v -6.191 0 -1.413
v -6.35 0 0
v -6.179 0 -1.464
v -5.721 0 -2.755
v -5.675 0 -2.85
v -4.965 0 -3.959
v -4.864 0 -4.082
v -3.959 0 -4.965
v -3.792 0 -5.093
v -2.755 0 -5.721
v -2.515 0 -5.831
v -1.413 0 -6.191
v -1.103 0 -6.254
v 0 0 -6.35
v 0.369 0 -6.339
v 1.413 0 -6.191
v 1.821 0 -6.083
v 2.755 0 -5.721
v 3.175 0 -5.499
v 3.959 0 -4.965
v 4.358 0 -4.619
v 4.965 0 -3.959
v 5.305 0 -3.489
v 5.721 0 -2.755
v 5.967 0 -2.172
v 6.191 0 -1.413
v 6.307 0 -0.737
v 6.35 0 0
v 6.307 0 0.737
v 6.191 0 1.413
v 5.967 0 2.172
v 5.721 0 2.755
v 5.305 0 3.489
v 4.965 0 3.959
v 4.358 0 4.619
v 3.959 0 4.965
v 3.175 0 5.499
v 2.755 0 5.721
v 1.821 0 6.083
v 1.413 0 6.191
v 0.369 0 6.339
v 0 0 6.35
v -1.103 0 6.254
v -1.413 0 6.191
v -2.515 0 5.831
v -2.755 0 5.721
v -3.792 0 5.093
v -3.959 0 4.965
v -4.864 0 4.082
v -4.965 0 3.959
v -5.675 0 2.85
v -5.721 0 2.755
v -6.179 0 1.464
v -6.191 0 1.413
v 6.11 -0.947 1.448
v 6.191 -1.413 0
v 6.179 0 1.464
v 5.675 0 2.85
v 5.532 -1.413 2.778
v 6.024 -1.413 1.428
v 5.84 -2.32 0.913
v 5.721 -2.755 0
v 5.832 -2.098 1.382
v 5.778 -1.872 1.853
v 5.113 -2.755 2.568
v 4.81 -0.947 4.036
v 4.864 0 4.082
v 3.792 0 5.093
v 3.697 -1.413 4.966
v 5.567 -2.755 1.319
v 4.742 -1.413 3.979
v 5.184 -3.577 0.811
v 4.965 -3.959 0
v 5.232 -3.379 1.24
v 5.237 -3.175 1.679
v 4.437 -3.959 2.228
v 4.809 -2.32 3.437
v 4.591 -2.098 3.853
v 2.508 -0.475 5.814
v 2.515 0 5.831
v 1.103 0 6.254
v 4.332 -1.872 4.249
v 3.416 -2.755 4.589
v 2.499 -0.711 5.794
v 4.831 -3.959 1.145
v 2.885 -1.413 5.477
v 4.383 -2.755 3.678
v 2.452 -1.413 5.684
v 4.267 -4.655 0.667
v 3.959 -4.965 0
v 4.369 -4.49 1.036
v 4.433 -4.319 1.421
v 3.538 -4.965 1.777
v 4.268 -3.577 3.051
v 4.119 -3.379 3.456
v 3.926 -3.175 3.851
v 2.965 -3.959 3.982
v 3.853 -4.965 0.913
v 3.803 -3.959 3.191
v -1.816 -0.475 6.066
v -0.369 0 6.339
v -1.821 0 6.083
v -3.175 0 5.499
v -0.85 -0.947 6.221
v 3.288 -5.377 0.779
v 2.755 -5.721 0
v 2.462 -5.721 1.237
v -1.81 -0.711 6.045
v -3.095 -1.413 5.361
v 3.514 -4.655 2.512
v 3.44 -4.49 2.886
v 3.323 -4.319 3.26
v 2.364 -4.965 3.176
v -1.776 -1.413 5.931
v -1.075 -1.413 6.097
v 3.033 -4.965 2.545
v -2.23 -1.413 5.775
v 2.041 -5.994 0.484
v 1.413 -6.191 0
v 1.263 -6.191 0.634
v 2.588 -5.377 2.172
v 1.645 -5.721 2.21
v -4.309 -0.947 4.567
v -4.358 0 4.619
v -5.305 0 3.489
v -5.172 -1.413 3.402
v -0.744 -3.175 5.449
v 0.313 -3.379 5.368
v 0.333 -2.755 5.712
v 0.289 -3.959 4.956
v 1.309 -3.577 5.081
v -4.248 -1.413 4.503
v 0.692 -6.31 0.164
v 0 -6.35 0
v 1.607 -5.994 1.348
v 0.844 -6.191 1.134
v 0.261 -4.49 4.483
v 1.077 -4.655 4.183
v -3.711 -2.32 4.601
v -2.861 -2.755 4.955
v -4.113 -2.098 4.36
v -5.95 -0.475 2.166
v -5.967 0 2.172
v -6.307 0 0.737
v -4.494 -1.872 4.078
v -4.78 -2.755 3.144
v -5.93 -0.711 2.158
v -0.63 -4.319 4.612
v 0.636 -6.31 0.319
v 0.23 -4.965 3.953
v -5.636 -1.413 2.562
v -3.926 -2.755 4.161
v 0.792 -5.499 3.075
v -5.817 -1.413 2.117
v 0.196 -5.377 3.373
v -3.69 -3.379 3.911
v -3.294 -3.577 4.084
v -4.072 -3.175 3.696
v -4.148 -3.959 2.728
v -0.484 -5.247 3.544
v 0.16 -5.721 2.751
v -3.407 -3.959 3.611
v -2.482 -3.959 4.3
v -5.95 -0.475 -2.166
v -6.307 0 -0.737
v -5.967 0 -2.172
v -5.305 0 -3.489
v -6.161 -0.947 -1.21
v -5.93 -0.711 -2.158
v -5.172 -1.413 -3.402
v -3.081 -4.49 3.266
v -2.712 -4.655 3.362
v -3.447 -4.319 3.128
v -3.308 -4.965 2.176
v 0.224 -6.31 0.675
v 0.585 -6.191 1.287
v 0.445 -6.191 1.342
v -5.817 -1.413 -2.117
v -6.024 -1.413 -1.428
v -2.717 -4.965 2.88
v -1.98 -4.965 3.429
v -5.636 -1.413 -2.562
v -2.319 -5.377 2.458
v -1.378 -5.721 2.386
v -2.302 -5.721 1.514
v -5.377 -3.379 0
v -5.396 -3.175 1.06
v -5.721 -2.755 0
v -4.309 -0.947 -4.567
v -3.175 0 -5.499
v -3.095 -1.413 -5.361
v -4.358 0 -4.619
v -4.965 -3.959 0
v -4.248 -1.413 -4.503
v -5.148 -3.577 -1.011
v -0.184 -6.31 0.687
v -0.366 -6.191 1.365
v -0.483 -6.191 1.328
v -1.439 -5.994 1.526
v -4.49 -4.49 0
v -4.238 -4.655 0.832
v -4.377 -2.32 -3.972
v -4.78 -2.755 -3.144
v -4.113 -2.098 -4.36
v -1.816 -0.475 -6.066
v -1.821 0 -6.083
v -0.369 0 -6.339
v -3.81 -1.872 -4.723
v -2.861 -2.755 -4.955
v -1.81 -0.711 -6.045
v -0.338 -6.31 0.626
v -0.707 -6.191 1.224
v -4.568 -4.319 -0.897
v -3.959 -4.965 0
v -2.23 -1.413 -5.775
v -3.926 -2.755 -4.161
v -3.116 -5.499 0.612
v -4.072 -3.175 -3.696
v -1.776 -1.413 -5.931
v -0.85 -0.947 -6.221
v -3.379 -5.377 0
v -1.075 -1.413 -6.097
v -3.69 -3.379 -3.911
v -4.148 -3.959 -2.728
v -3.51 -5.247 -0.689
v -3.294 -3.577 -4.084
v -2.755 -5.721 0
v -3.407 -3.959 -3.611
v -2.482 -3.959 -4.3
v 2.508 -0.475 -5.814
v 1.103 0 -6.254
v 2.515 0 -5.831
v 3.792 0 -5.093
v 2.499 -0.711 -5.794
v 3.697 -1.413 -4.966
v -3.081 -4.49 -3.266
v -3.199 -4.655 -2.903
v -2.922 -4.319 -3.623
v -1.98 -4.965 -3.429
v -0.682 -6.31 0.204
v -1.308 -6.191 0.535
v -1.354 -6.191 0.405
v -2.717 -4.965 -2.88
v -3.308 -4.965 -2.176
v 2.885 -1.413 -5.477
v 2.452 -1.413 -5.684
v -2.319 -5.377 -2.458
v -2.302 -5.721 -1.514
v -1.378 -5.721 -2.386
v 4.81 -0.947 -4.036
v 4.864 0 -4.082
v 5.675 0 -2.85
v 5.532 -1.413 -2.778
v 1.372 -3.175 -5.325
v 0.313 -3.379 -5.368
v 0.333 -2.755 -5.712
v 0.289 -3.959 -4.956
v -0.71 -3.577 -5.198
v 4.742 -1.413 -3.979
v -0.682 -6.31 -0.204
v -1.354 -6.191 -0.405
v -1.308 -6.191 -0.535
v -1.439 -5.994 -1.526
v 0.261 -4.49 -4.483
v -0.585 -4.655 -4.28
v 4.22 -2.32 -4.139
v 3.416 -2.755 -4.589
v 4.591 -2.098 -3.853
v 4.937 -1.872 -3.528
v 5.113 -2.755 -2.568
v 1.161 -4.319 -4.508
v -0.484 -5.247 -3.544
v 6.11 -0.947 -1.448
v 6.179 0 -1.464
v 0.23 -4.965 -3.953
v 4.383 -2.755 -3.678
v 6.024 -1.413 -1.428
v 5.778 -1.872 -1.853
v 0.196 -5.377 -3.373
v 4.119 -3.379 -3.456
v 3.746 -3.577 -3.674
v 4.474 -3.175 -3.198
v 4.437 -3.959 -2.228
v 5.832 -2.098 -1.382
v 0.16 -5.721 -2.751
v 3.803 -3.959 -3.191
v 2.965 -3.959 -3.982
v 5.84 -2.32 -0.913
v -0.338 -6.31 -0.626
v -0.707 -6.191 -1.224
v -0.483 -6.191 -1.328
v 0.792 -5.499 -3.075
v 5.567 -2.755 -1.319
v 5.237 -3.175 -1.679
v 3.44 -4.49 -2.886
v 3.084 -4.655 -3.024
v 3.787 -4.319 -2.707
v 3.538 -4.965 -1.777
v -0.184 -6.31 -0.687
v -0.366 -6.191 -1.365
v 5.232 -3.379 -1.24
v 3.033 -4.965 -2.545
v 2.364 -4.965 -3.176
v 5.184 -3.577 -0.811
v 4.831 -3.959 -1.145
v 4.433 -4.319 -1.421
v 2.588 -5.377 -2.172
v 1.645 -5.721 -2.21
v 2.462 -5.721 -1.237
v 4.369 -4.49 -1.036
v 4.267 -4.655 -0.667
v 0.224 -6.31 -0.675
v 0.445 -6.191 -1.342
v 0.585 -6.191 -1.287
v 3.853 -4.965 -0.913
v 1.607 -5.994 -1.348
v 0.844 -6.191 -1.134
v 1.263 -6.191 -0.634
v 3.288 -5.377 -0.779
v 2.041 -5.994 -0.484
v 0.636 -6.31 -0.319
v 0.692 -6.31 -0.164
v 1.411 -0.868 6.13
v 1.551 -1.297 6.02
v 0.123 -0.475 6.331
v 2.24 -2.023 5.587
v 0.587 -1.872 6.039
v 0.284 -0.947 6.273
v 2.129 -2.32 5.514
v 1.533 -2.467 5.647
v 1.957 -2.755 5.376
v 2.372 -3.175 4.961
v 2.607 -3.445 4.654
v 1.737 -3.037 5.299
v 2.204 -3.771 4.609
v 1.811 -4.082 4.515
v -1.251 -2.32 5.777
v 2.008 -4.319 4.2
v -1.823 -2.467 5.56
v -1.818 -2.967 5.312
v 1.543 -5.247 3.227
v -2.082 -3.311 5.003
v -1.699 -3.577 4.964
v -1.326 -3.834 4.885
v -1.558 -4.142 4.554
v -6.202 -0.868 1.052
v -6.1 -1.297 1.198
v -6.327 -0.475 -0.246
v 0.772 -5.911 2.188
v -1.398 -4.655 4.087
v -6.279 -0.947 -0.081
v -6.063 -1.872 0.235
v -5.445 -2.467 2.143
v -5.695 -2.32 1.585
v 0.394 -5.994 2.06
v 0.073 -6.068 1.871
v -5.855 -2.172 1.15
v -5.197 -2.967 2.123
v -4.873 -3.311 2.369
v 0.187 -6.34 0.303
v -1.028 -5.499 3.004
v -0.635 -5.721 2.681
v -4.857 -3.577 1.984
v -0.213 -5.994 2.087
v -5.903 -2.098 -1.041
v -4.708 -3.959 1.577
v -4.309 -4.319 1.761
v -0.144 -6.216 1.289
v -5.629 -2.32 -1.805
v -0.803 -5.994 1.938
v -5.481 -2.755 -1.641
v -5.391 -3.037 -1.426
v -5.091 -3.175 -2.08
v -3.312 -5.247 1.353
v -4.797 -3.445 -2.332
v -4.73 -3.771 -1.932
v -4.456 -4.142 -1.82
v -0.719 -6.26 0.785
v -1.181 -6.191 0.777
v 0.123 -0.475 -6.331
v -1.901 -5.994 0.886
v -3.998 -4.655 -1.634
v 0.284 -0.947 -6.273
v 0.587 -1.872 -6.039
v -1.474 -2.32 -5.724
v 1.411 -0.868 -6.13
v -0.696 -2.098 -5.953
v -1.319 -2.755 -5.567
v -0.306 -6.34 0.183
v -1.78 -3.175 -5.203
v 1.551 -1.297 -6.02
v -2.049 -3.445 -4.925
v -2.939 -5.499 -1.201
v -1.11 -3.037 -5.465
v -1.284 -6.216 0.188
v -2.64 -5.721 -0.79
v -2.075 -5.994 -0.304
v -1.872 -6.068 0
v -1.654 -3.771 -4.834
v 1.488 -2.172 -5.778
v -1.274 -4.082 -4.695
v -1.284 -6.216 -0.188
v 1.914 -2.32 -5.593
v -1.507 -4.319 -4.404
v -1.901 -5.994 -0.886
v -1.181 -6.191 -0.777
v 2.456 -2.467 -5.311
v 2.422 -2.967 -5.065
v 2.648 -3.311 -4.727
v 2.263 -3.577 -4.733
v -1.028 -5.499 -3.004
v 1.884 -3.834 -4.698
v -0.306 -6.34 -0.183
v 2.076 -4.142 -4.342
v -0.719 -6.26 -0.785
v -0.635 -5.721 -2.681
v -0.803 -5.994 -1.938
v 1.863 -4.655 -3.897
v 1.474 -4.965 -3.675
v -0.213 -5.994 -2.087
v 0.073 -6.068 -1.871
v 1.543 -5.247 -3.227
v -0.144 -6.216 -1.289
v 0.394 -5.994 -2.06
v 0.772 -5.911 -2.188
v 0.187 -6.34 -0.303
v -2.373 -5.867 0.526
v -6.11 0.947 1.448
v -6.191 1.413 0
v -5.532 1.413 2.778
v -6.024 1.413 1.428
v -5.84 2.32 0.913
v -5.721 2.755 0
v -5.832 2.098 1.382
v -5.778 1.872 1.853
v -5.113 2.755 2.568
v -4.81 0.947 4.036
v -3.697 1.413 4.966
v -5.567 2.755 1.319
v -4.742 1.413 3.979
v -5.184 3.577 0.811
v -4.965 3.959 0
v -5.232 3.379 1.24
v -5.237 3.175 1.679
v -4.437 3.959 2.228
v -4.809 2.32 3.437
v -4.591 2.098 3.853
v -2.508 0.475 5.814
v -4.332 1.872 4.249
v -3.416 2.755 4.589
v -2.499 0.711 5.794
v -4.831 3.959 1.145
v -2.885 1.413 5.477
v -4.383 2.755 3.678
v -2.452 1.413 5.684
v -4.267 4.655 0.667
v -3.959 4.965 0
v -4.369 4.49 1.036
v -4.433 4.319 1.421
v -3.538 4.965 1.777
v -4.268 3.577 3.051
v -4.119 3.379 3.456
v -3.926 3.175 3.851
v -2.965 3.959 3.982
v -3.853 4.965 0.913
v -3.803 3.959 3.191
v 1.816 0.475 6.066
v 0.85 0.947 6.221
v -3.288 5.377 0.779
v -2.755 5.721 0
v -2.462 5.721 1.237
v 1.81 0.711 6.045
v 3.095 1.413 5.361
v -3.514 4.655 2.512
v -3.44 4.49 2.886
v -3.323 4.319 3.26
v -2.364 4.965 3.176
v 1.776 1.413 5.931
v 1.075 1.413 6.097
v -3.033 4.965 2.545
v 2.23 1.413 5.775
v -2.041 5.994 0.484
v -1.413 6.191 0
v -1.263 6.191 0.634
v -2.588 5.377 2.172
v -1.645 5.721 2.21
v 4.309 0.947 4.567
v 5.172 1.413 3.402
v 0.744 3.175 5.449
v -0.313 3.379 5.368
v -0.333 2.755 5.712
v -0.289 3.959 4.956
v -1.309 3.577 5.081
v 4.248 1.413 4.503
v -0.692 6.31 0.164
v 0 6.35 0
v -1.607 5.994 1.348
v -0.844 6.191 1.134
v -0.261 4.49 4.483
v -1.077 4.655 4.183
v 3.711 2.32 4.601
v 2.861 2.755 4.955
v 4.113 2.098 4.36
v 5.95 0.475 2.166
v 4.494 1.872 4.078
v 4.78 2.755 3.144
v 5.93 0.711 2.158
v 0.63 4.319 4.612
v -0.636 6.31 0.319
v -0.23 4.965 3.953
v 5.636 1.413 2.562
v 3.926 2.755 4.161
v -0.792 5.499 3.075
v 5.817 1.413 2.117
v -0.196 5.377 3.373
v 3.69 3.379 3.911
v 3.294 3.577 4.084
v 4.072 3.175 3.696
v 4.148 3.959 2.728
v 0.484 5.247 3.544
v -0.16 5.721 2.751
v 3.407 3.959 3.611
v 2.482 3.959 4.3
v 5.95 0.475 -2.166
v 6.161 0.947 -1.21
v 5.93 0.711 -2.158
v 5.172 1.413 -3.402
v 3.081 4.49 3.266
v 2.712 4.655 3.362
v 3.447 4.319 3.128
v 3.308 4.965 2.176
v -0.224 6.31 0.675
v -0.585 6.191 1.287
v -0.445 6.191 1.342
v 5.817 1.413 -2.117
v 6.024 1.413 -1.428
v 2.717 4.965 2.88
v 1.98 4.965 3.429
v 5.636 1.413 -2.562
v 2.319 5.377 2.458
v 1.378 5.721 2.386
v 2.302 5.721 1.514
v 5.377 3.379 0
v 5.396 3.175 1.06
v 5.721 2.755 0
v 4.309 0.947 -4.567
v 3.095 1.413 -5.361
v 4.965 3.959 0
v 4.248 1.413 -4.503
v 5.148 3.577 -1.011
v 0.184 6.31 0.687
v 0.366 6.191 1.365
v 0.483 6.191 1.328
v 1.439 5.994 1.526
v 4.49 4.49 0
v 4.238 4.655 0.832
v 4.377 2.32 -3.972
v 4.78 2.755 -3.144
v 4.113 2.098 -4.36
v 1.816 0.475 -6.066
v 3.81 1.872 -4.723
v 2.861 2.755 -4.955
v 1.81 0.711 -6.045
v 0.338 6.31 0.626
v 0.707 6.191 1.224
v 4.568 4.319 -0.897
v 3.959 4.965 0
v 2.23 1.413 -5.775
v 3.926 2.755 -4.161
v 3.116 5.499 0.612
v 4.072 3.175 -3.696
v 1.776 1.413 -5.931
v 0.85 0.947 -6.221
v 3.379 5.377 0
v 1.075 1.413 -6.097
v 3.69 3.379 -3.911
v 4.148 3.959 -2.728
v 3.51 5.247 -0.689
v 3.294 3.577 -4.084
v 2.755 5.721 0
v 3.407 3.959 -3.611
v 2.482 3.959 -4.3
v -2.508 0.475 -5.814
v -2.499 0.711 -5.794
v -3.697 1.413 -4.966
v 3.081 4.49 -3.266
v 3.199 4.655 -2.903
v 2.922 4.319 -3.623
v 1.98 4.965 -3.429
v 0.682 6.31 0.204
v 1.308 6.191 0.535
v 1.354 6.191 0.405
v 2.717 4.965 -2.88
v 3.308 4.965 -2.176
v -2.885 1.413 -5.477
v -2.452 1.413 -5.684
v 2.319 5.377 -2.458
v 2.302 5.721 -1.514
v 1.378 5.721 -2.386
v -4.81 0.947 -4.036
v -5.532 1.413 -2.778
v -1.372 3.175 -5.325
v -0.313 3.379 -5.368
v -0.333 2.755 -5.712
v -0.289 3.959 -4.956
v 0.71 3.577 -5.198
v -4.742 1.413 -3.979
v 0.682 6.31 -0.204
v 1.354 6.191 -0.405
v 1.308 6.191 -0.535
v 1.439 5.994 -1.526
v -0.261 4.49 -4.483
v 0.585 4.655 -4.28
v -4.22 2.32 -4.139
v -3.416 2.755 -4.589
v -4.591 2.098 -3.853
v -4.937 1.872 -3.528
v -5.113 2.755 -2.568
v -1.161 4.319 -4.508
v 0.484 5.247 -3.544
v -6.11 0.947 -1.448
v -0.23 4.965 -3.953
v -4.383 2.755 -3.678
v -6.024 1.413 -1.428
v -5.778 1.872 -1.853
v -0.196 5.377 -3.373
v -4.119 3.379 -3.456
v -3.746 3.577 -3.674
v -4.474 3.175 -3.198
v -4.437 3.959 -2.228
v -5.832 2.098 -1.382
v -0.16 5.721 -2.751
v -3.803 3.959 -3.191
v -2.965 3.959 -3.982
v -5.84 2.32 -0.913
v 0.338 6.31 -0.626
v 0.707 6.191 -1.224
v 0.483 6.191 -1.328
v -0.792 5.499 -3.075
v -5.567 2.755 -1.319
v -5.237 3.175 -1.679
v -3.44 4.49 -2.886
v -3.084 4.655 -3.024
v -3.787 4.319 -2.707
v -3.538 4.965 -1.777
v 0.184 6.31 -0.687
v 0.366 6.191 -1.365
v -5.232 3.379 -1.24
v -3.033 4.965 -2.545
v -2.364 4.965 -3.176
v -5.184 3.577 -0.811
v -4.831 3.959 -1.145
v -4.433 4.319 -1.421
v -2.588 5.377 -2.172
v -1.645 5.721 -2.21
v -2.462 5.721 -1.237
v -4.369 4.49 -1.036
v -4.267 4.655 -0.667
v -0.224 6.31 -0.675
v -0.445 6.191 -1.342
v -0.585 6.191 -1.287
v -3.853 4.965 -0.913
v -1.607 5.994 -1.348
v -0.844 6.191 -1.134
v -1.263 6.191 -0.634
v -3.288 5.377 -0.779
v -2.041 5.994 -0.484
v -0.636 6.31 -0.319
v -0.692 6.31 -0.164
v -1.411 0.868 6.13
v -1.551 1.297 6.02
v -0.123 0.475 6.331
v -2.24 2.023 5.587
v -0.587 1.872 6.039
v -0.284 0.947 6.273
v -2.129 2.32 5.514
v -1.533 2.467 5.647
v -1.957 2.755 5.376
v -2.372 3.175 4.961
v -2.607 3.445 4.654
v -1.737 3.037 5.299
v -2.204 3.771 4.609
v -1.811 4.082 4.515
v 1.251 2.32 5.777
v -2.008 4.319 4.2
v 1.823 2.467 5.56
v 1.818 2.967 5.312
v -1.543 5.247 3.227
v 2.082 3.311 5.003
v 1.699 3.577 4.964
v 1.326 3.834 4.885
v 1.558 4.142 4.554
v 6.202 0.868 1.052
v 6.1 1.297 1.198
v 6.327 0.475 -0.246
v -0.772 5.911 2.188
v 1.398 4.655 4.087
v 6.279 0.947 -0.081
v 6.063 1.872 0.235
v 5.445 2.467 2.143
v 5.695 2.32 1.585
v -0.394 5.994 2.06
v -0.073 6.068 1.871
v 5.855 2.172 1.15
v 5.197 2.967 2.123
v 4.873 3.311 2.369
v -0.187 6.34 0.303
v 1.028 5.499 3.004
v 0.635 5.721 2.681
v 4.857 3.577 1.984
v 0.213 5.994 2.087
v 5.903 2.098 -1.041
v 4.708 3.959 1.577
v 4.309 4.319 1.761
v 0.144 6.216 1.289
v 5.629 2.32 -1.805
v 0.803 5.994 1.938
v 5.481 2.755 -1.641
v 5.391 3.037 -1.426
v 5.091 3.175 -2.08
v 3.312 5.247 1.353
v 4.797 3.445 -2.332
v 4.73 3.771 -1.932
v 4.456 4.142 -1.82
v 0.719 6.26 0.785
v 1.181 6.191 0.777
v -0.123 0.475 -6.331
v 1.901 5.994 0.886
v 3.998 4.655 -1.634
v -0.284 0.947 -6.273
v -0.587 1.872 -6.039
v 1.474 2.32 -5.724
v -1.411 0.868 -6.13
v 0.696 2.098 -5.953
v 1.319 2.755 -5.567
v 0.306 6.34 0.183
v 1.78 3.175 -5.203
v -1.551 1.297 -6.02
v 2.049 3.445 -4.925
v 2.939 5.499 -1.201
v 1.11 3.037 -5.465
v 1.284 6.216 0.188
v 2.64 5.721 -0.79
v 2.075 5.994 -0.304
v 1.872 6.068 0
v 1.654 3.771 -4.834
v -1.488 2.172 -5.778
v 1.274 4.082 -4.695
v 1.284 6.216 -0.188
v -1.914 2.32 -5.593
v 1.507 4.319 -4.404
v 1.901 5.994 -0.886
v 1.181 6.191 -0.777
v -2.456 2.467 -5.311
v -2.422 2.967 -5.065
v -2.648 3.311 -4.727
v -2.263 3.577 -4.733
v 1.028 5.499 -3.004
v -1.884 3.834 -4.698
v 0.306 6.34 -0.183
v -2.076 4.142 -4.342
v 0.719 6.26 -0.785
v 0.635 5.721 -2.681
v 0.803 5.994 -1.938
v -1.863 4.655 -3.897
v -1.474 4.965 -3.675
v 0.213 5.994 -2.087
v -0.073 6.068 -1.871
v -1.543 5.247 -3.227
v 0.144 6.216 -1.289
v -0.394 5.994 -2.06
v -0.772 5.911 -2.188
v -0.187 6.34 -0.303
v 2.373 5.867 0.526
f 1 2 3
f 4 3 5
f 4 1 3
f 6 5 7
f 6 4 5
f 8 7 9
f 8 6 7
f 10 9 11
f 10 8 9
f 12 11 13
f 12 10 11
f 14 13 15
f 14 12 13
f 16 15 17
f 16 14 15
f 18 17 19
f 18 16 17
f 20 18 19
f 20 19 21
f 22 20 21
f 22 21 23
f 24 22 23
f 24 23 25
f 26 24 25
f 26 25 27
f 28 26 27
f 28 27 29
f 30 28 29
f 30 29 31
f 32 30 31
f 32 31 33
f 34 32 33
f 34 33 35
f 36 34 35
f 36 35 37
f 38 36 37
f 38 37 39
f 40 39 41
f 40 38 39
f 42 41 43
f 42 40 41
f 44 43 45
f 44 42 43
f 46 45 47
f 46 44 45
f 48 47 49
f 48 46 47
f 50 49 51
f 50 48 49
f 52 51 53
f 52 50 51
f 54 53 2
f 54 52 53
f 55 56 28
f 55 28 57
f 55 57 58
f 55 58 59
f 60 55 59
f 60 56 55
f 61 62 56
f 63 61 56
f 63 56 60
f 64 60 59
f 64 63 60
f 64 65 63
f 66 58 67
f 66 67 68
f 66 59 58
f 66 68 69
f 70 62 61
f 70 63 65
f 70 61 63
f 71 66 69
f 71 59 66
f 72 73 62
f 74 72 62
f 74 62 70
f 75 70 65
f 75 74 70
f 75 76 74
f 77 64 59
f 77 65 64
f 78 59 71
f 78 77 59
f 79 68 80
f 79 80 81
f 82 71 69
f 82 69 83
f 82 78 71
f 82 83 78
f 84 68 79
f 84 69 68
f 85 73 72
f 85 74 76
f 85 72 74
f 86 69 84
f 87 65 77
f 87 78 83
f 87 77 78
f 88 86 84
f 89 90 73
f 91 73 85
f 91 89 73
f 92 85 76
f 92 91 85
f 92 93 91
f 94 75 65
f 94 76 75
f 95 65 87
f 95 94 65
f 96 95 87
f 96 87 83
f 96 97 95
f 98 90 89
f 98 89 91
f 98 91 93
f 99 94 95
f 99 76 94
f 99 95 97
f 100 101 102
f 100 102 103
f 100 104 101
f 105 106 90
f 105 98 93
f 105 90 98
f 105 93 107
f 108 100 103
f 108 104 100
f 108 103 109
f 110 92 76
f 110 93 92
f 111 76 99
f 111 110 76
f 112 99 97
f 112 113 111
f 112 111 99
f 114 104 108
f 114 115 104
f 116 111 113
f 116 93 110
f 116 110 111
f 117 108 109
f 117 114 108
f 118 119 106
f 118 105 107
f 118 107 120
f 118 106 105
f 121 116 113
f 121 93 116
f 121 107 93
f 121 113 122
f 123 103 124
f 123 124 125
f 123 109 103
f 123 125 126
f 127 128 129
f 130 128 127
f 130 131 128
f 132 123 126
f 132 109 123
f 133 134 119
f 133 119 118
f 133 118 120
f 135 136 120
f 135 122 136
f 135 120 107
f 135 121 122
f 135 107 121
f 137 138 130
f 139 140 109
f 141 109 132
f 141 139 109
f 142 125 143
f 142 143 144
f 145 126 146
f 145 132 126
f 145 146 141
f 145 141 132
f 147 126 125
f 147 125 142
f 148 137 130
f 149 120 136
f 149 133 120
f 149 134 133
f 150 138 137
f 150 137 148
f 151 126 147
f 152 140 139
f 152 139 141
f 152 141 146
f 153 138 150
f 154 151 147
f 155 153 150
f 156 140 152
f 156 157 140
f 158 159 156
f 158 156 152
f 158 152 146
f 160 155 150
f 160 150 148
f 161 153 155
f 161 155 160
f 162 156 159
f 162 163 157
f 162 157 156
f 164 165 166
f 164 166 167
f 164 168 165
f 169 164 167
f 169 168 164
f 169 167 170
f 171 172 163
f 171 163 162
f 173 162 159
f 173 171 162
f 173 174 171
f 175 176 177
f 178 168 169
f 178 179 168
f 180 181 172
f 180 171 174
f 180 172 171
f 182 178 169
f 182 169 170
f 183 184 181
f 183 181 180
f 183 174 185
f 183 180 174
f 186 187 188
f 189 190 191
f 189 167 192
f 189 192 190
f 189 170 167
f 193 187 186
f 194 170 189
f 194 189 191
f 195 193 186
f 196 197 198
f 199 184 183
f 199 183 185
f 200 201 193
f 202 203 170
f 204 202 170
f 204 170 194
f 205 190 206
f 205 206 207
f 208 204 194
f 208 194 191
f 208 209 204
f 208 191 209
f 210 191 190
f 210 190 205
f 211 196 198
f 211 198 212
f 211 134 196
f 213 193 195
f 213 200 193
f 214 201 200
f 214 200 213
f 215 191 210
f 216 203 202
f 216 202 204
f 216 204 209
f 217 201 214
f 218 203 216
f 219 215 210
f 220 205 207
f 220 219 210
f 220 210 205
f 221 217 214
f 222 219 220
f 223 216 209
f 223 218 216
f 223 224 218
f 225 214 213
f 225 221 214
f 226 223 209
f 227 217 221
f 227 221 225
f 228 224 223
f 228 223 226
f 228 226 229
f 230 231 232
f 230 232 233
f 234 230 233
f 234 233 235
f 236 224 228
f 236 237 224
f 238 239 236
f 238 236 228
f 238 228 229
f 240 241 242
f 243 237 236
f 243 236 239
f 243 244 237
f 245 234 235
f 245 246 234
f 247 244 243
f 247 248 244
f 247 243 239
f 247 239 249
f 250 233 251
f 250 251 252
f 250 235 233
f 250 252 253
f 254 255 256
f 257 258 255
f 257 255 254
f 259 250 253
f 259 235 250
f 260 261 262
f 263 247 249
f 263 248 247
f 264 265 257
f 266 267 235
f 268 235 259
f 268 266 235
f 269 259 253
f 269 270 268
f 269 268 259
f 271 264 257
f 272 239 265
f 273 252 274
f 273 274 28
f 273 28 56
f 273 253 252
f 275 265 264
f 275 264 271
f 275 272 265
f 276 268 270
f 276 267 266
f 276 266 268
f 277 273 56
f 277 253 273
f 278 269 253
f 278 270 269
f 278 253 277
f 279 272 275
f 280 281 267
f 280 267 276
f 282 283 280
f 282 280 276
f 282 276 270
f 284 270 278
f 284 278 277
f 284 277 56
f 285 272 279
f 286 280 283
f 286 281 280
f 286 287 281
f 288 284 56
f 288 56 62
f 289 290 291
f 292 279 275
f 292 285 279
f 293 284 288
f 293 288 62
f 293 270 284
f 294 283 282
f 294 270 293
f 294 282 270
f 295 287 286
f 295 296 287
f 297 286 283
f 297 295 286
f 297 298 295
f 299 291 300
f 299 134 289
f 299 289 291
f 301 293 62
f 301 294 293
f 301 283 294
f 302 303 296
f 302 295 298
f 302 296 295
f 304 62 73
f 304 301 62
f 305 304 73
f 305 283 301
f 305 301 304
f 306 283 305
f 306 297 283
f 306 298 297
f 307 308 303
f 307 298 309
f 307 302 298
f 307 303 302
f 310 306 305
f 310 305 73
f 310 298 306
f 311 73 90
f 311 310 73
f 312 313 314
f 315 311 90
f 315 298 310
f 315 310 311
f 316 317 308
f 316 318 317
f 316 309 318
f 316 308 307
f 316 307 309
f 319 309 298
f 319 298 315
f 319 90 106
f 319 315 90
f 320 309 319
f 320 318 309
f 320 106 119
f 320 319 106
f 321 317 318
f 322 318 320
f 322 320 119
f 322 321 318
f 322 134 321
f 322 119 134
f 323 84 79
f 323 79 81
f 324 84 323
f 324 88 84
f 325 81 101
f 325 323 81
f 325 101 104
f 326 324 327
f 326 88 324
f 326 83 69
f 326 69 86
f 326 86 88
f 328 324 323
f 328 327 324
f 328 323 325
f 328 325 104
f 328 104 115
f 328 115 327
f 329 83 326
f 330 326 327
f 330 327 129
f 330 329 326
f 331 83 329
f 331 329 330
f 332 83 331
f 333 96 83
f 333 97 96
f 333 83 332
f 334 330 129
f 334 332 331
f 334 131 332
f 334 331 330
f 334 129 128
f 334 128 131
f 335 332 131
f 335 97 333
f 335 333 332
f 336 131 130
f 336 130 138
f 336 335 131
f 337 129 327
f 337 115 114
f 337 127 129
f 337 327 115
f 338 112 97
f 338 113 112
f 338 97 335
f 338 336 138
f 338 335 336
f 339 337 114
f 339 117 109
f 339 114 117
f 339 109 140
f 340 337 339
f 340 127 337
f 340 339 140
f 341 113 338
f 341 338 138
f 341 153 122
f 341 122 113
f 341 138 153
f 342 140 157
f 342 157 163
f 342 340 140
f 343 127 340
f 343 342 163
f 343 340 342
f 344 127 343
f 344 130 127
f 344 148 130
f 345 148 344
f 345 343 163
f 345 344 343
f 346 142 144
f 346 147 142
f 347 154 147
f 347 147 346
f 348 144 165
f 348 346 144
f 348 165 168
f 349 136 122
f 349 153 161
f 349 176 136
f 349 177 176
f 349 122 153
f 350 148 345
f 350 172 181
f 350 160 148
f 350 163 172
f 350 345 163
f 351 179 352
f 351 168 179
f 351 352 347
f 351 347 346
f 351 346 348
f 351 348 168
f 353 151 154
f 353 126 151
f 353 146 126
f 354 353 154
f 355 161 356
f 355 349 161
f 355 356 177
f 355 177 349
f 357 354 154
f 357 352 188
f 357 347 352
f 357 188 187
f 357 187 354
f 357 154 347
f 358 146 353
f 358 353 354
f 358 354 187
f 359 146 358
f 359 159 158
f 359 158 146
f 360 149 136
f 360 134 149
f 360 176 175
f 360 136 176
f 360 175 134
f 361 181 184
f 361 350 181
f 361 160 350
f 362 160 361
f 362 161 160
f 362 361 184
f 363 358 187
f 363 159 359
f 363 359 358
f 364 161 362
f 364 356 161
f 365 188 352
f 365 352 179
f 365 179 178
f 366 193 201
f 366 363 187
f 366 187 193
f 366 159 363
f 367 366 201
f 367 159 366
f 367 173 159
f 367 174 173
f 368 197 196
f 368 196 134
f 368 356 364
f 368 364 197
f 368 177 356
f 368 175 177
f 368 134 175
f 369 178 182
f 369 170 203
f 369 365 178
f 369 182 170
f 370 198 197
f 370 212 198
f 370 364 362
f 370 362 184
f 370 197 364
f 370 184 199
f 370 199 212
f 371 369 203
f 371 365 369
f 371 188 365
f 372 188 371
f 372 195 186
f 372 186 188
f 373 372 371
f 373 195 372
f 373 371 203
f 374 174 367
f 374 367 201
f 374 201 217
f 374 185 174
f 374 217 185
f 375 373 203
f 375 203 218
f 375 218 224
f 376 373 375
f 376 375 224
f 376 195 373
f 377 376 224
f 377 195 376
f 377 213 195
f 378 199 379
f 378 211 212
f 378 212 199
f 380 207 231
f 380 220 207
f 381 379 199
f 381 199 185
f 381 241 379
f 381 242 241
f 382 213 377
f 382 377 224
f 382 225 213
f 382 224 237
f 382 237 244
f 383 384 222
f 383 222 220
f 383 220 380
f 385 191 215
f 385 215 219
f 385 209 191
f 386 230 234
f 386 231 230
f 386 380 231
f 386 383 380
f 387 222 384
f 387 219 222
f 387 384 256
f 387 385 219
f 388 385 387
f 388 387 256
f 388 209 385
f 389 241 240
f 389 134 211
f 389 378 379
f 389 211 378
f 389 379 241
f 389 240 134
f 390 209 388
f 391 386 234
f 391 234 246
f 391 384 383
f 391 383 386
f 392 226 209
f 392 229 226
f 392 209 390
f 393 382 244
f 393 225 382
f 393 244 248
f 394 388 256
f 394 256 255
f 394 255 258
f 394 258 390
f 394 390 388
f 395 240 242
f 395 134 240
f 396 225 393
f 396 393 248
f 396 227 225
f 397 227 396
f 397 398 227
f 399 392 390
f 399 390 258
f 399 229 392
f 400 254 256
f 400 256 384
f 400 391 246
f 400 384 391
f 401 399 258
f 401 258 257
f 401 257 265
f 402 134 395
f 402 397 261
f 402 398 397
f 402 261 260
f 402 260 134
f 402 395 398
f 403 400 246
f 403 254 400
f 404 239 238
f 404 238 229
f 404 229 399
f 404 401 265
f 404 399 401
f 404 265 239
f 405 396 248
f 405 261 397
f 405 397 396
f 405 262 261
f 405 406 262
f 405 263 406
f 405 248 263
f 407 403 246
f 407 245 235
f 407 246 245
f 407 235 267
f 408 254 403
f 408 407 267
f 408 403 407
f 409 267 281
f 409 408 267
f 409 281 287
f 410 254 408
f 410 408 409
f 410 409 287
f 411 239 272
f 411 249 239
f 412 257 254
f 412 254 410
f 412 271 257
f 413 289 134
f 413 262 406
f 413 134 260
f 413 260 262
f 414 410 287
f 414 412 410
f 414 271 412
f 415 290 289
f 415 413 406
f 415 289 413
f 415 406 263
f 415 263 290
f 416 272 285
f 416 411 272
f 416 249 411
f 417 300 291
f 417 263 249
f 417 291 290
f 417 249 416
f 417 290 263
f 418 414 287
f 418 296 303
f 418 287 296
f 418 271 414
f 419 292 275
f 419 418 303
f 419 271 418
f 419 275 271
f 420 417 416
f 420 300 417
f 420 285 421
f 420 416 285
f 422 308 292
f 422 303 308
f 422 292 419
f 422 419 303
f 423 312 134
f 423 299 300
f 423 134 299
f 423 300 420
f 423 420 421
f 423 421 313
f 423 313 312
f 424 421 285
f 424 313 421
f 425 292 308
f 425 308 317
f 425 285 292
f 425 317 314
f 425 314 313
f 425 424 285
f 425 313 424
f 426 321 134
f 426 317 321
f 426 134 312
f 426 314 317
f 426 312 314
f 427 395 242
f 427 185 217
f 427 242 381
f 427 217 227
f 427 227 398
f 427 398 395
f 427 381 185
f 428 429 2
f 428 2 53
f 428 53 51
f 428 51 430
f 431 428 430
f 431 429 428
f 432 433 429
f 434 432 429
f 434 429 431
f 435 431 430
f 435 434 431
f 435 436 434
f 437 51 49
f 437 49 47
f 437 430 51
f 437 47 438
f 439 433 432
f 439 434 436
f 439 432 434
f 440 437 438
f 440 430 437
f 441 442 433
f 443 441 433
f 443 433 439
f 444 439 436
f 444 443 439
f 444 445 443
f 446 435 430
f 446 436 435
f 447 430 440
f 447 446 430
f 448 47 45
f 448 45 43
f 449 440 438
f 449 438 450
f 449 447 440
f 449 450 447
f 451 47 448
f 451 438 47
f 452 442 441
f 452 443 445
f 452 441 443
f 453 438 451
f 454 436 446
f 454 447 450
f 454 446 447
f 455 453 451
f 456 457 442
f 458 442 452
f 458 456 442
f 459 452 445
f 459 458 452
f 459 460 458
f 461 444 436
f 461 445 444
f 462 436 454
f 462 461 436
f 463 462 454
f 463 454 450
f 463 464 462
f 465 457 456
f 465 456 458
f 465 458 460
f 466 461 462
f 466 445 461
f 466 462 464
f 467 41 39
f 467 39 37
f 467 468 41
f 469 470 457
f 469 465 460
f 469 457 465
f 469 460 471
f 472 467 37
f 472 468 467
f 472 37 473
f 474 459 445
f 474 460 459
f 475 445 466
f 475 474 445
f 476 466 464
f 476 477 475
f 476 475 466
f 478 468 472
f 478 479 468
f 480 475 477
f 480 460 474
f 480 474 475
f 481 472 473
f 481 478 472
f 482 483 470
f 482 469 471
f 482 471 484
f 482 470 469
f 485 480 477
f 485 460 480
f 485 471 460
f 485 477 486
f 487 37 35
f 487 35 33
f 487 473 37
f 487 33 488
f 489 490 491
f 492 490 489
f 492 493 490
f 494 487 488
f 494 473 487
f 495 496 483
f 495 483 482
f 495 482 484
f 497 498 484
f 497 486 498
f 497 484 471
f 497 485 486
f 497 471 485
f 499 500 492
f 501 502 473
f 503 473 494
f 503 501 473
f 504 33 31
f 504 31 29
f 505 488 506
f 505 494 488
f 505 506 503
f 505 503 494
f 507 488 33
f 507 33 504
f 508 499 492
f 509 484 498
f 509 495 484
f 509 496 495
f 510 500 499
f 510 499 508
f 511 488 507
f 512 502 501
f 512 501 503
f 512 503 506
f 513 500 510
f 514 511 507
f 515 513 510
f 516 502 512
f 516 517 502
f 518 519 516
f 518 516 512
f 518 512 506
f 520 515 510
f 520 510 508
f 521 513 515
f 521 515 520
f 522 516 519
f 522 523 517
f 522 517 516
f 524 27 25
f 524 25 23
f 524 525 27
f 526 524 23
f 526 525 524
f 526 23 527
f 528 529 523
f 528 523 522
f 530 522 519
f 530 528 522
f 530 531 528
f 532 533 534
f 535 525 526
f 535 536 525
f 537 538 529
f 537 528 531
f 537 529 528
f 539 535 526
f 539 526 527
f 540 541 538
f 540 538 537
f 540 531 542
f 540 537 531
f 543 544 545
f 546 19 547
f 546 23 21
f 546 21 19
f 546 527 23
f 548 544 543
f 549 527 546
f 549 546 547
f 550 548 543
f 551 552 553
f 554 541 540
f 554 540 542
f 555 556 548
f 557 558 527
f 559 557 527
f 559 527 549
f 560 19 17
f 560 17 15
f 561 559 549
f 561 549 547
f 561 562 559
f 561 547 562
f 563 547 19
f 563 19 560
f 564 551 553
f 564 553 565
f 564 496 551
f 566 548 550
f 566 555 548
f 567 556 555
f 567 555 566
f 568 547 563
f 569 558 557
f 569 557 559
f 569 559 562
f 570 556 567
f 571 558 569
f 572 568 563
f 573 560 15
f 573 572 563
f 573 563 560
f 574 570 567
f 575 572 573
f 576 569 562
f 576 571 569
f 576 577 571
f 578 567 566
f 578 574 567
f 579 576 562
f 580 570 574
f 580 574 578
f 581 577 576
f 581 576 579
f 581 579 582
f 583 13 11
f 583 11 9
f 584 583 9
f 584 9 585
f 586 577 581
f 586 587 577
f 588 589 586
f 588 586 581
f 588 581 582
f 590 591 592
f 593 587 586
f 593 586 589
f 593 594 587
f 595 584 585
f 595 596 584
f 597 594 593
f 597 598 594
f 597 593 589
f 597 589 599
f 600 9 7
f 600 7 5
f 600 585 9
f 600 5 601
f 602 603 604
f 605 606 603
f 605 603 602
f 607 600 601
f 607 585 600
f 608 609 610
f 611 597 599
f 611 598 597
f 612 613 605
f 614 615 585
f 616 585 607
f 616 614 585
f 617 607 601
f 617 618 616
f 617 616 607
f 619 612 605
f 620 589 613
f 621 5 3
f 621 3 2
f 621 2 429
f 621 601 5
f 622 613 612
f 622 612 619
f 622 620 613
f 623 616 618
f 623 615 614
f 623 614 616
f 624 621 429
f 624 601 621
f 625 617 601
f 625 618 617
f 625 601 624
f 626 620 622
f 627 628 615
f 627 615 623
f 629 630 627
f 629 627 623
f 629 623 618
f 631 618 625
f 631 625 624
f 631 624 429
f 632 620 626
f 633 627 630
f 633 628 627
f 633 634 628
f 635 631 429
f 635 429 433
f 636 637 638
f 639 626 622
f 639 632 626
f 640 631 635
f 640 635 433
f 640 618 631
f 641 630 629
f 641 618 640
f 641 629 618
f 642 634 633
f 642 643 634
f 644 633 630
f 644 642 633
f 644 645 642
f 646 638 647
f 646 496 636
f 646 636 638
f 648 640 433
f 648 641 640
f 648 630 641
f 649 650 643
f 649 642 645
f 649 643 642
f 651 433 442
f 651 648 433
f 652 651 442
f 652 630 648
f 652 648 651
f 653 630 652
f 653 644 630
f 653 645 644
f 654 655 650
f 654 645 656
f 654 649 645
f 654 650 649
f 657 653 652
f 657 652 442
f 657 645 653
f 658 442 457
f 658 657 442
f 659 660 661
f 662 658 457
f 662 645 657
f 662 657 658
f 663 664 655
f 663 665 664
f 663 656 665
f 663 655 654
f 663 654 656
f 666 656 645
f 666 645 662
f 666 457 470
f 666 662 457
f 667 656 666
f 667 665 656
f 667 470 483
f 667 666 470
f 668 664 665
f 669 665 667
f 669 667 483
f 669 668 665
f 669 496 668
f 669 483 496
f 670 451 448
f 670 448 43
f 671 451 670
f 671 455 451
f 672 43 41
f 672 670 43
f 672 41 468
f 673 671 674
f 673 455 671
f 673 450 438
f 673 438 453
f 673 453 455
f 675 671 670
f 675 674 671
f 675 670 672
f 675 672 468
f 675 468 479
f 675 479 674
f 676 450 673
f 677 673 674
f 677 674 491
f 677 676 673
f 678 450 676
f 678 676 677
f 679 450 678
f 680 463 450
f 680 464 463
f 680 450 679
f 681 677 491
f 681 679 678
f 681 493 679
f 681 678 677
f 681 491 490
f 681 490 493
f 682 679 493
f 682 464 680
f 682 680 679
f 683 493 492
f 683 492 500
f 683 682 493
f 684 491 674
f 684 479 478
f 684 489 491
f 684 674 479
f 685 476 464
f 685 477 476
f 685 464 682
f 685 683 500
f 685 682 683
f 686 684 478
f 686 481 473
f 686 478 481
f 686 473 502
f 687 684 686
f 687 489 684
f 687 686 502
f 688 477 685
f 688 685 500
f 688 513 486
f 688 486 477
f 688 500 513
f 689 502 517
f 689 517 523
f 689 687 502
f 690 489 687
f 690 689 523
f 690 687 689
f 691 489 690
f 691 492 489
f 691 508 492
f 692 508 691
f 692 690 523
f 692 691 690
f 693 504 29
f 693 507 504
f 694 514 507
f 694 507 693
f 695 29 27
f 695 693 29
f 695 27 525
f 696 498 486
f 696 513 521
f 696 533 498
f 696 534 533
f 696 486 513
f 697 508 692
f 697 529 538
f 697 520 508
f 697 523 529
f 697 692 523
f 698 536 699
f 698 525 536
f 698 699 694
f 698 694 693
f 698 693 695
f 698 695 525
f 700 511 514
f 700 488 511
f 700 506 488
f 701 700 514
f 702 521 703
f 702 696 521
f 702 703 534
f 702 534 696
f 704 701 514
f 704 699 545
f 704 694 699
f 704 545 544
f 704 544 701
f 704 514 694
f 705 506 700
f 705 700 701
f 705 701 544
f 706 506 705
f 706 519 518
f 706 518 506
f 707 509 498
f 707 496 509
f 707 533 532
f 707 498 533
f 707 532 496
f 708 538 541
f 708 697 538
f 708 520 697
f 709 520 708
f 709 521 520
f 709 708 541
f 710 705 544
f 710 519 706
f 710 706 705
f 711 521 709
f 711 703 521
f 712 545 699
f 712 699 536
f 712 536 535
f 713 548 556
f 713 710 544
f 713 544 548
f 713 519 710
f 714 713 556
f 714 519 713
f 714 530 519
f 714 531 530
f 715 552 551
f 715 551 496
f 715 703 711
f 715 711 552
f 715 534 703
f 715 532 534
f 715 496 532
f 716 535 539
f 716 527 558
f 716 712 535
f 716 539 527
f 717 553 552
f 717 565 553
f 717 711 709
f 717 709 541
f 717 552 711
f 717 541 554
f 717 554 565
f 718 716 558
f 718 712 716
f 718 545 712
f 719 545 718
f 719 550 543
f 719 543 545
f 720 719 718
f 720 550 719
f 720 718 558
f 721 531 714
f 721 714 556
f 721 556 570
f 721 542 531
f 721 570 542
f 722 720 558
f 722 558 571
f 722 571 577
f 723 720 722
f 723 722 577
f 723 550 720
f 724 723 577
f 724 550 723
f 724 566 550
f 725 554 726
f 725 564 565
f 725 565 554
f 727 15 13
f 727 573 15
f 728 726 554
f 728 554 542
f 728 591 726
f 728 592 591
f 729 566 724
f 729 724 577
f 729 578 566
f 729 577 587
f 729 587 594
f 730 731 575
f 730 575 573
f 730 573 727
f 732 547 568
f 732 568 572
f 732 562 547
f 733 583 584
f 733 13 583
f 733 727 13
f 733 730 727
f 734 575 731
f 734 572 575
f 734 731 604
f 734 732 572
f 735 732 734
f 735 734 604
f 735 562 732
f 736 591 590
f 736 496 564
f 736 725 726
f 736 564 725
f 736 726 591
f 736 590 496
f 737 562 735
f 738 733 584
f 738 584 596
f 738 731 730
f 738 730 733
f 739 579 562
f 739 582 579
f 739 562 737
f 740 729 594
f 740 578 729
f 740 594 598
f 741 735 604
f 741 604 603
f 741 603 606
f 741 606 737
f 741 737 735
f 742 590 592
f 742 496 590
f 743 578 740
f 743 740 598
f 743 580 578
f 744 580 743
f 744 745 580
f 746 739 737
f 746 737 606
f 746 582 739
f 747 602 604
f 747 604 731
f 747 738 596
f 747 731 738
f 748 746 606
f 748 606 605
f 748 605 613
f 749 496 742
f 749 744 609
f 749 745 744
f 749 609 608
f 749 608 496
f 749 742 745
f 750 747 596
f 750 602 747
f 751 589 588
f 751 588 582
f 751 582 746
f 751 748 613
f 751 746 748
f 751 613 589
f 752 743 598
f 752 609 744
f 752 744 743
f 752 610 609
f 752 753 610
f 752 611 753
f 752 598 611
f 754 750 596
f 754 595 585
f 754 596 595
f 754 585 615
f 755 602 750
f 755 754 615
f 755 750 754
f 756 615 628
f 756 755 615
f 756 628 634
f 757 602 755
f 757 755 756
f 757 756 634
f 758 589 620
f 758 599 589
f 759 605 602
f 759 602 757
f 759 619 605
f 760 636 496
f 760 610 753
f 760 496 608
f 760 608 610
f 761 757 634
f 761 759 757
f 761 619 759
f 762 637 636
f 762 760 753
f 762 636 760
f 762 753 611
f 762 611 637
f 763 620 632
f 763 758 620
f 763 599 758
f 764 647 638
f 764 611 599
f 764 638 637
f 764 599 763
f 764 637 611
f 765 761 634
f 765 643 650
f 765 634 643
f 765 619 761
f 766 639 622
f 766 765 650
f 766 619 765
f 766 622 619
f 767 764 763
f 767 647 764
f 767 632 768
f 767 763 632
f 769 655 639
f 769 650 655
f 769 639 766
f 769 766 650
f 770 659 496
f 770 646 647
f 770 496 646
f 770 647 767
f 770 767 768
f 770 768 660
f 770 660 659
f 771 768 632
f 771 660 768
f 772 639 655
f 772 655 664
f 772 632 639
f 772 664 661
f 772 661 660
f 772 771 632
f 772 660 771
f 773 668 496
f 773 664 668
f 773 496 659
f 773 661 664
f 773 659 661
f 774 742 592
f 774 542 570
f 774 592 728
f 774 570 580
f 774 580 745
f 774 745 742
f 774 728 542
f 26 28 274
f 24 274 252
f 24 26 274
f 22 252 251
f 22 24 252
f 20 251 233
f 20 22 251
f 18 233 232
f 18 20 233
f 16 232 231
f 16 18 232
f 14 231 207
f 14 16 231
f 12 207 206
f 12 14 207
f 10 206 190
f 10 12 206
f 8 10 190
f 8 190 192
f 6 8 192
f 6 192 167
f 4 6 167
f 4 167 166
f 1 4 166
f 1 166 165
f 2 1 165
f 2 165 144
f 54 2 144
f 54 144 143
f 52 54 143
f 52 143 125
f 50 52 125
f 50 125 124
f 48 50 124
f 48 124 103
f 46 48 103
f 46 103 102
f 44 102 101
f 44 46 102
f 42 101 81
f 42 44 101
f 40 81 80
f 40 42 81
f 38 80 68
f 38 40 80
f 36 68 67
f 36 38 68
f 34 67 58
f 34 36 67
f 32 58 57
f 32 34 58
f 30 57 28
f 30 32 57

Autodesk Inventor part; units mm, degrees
ref_plane "YZ Plane" through (0, 0, 0) normal (1, 0, 0) x (0, 1, 0)
ref_plane "XZ Plane" through (0, 0, 0) normal (0, 1, 0) x (-1, 0, 0)
ref_plane "XY Plane" through (0, 0, 0) normal (0, 0, 1) x (1, 0, 0)
sketch "Sketch1" plane through (0, 0, 0) normal (0, 1, 0) x (-1, 0, 0)
  circle A0 centre (0, 0) radius 6.35
  dimension "d0" = 12.7
extrude "Extrusion1" add sketch "Sketch1" along normal blind 6.35
fillet "Fillet1" radius 6.35 1 edges at (6.35, 6.35, 0)
sketch "Sketch2" plane through (0, 0, 0) normal (0, -1, 0) x (1, 0, 0)
  circle A0 centre (0, 0) radius 6.35
  dimension "d4" = 12.7
extrude "Extrusion2" add sketch "Sketch2" along normal blind 6.35
fillet "Fillet2" radius 6.35 1 edges at (-6.35, -6.35, 0)
properties part number "caster_ball"
